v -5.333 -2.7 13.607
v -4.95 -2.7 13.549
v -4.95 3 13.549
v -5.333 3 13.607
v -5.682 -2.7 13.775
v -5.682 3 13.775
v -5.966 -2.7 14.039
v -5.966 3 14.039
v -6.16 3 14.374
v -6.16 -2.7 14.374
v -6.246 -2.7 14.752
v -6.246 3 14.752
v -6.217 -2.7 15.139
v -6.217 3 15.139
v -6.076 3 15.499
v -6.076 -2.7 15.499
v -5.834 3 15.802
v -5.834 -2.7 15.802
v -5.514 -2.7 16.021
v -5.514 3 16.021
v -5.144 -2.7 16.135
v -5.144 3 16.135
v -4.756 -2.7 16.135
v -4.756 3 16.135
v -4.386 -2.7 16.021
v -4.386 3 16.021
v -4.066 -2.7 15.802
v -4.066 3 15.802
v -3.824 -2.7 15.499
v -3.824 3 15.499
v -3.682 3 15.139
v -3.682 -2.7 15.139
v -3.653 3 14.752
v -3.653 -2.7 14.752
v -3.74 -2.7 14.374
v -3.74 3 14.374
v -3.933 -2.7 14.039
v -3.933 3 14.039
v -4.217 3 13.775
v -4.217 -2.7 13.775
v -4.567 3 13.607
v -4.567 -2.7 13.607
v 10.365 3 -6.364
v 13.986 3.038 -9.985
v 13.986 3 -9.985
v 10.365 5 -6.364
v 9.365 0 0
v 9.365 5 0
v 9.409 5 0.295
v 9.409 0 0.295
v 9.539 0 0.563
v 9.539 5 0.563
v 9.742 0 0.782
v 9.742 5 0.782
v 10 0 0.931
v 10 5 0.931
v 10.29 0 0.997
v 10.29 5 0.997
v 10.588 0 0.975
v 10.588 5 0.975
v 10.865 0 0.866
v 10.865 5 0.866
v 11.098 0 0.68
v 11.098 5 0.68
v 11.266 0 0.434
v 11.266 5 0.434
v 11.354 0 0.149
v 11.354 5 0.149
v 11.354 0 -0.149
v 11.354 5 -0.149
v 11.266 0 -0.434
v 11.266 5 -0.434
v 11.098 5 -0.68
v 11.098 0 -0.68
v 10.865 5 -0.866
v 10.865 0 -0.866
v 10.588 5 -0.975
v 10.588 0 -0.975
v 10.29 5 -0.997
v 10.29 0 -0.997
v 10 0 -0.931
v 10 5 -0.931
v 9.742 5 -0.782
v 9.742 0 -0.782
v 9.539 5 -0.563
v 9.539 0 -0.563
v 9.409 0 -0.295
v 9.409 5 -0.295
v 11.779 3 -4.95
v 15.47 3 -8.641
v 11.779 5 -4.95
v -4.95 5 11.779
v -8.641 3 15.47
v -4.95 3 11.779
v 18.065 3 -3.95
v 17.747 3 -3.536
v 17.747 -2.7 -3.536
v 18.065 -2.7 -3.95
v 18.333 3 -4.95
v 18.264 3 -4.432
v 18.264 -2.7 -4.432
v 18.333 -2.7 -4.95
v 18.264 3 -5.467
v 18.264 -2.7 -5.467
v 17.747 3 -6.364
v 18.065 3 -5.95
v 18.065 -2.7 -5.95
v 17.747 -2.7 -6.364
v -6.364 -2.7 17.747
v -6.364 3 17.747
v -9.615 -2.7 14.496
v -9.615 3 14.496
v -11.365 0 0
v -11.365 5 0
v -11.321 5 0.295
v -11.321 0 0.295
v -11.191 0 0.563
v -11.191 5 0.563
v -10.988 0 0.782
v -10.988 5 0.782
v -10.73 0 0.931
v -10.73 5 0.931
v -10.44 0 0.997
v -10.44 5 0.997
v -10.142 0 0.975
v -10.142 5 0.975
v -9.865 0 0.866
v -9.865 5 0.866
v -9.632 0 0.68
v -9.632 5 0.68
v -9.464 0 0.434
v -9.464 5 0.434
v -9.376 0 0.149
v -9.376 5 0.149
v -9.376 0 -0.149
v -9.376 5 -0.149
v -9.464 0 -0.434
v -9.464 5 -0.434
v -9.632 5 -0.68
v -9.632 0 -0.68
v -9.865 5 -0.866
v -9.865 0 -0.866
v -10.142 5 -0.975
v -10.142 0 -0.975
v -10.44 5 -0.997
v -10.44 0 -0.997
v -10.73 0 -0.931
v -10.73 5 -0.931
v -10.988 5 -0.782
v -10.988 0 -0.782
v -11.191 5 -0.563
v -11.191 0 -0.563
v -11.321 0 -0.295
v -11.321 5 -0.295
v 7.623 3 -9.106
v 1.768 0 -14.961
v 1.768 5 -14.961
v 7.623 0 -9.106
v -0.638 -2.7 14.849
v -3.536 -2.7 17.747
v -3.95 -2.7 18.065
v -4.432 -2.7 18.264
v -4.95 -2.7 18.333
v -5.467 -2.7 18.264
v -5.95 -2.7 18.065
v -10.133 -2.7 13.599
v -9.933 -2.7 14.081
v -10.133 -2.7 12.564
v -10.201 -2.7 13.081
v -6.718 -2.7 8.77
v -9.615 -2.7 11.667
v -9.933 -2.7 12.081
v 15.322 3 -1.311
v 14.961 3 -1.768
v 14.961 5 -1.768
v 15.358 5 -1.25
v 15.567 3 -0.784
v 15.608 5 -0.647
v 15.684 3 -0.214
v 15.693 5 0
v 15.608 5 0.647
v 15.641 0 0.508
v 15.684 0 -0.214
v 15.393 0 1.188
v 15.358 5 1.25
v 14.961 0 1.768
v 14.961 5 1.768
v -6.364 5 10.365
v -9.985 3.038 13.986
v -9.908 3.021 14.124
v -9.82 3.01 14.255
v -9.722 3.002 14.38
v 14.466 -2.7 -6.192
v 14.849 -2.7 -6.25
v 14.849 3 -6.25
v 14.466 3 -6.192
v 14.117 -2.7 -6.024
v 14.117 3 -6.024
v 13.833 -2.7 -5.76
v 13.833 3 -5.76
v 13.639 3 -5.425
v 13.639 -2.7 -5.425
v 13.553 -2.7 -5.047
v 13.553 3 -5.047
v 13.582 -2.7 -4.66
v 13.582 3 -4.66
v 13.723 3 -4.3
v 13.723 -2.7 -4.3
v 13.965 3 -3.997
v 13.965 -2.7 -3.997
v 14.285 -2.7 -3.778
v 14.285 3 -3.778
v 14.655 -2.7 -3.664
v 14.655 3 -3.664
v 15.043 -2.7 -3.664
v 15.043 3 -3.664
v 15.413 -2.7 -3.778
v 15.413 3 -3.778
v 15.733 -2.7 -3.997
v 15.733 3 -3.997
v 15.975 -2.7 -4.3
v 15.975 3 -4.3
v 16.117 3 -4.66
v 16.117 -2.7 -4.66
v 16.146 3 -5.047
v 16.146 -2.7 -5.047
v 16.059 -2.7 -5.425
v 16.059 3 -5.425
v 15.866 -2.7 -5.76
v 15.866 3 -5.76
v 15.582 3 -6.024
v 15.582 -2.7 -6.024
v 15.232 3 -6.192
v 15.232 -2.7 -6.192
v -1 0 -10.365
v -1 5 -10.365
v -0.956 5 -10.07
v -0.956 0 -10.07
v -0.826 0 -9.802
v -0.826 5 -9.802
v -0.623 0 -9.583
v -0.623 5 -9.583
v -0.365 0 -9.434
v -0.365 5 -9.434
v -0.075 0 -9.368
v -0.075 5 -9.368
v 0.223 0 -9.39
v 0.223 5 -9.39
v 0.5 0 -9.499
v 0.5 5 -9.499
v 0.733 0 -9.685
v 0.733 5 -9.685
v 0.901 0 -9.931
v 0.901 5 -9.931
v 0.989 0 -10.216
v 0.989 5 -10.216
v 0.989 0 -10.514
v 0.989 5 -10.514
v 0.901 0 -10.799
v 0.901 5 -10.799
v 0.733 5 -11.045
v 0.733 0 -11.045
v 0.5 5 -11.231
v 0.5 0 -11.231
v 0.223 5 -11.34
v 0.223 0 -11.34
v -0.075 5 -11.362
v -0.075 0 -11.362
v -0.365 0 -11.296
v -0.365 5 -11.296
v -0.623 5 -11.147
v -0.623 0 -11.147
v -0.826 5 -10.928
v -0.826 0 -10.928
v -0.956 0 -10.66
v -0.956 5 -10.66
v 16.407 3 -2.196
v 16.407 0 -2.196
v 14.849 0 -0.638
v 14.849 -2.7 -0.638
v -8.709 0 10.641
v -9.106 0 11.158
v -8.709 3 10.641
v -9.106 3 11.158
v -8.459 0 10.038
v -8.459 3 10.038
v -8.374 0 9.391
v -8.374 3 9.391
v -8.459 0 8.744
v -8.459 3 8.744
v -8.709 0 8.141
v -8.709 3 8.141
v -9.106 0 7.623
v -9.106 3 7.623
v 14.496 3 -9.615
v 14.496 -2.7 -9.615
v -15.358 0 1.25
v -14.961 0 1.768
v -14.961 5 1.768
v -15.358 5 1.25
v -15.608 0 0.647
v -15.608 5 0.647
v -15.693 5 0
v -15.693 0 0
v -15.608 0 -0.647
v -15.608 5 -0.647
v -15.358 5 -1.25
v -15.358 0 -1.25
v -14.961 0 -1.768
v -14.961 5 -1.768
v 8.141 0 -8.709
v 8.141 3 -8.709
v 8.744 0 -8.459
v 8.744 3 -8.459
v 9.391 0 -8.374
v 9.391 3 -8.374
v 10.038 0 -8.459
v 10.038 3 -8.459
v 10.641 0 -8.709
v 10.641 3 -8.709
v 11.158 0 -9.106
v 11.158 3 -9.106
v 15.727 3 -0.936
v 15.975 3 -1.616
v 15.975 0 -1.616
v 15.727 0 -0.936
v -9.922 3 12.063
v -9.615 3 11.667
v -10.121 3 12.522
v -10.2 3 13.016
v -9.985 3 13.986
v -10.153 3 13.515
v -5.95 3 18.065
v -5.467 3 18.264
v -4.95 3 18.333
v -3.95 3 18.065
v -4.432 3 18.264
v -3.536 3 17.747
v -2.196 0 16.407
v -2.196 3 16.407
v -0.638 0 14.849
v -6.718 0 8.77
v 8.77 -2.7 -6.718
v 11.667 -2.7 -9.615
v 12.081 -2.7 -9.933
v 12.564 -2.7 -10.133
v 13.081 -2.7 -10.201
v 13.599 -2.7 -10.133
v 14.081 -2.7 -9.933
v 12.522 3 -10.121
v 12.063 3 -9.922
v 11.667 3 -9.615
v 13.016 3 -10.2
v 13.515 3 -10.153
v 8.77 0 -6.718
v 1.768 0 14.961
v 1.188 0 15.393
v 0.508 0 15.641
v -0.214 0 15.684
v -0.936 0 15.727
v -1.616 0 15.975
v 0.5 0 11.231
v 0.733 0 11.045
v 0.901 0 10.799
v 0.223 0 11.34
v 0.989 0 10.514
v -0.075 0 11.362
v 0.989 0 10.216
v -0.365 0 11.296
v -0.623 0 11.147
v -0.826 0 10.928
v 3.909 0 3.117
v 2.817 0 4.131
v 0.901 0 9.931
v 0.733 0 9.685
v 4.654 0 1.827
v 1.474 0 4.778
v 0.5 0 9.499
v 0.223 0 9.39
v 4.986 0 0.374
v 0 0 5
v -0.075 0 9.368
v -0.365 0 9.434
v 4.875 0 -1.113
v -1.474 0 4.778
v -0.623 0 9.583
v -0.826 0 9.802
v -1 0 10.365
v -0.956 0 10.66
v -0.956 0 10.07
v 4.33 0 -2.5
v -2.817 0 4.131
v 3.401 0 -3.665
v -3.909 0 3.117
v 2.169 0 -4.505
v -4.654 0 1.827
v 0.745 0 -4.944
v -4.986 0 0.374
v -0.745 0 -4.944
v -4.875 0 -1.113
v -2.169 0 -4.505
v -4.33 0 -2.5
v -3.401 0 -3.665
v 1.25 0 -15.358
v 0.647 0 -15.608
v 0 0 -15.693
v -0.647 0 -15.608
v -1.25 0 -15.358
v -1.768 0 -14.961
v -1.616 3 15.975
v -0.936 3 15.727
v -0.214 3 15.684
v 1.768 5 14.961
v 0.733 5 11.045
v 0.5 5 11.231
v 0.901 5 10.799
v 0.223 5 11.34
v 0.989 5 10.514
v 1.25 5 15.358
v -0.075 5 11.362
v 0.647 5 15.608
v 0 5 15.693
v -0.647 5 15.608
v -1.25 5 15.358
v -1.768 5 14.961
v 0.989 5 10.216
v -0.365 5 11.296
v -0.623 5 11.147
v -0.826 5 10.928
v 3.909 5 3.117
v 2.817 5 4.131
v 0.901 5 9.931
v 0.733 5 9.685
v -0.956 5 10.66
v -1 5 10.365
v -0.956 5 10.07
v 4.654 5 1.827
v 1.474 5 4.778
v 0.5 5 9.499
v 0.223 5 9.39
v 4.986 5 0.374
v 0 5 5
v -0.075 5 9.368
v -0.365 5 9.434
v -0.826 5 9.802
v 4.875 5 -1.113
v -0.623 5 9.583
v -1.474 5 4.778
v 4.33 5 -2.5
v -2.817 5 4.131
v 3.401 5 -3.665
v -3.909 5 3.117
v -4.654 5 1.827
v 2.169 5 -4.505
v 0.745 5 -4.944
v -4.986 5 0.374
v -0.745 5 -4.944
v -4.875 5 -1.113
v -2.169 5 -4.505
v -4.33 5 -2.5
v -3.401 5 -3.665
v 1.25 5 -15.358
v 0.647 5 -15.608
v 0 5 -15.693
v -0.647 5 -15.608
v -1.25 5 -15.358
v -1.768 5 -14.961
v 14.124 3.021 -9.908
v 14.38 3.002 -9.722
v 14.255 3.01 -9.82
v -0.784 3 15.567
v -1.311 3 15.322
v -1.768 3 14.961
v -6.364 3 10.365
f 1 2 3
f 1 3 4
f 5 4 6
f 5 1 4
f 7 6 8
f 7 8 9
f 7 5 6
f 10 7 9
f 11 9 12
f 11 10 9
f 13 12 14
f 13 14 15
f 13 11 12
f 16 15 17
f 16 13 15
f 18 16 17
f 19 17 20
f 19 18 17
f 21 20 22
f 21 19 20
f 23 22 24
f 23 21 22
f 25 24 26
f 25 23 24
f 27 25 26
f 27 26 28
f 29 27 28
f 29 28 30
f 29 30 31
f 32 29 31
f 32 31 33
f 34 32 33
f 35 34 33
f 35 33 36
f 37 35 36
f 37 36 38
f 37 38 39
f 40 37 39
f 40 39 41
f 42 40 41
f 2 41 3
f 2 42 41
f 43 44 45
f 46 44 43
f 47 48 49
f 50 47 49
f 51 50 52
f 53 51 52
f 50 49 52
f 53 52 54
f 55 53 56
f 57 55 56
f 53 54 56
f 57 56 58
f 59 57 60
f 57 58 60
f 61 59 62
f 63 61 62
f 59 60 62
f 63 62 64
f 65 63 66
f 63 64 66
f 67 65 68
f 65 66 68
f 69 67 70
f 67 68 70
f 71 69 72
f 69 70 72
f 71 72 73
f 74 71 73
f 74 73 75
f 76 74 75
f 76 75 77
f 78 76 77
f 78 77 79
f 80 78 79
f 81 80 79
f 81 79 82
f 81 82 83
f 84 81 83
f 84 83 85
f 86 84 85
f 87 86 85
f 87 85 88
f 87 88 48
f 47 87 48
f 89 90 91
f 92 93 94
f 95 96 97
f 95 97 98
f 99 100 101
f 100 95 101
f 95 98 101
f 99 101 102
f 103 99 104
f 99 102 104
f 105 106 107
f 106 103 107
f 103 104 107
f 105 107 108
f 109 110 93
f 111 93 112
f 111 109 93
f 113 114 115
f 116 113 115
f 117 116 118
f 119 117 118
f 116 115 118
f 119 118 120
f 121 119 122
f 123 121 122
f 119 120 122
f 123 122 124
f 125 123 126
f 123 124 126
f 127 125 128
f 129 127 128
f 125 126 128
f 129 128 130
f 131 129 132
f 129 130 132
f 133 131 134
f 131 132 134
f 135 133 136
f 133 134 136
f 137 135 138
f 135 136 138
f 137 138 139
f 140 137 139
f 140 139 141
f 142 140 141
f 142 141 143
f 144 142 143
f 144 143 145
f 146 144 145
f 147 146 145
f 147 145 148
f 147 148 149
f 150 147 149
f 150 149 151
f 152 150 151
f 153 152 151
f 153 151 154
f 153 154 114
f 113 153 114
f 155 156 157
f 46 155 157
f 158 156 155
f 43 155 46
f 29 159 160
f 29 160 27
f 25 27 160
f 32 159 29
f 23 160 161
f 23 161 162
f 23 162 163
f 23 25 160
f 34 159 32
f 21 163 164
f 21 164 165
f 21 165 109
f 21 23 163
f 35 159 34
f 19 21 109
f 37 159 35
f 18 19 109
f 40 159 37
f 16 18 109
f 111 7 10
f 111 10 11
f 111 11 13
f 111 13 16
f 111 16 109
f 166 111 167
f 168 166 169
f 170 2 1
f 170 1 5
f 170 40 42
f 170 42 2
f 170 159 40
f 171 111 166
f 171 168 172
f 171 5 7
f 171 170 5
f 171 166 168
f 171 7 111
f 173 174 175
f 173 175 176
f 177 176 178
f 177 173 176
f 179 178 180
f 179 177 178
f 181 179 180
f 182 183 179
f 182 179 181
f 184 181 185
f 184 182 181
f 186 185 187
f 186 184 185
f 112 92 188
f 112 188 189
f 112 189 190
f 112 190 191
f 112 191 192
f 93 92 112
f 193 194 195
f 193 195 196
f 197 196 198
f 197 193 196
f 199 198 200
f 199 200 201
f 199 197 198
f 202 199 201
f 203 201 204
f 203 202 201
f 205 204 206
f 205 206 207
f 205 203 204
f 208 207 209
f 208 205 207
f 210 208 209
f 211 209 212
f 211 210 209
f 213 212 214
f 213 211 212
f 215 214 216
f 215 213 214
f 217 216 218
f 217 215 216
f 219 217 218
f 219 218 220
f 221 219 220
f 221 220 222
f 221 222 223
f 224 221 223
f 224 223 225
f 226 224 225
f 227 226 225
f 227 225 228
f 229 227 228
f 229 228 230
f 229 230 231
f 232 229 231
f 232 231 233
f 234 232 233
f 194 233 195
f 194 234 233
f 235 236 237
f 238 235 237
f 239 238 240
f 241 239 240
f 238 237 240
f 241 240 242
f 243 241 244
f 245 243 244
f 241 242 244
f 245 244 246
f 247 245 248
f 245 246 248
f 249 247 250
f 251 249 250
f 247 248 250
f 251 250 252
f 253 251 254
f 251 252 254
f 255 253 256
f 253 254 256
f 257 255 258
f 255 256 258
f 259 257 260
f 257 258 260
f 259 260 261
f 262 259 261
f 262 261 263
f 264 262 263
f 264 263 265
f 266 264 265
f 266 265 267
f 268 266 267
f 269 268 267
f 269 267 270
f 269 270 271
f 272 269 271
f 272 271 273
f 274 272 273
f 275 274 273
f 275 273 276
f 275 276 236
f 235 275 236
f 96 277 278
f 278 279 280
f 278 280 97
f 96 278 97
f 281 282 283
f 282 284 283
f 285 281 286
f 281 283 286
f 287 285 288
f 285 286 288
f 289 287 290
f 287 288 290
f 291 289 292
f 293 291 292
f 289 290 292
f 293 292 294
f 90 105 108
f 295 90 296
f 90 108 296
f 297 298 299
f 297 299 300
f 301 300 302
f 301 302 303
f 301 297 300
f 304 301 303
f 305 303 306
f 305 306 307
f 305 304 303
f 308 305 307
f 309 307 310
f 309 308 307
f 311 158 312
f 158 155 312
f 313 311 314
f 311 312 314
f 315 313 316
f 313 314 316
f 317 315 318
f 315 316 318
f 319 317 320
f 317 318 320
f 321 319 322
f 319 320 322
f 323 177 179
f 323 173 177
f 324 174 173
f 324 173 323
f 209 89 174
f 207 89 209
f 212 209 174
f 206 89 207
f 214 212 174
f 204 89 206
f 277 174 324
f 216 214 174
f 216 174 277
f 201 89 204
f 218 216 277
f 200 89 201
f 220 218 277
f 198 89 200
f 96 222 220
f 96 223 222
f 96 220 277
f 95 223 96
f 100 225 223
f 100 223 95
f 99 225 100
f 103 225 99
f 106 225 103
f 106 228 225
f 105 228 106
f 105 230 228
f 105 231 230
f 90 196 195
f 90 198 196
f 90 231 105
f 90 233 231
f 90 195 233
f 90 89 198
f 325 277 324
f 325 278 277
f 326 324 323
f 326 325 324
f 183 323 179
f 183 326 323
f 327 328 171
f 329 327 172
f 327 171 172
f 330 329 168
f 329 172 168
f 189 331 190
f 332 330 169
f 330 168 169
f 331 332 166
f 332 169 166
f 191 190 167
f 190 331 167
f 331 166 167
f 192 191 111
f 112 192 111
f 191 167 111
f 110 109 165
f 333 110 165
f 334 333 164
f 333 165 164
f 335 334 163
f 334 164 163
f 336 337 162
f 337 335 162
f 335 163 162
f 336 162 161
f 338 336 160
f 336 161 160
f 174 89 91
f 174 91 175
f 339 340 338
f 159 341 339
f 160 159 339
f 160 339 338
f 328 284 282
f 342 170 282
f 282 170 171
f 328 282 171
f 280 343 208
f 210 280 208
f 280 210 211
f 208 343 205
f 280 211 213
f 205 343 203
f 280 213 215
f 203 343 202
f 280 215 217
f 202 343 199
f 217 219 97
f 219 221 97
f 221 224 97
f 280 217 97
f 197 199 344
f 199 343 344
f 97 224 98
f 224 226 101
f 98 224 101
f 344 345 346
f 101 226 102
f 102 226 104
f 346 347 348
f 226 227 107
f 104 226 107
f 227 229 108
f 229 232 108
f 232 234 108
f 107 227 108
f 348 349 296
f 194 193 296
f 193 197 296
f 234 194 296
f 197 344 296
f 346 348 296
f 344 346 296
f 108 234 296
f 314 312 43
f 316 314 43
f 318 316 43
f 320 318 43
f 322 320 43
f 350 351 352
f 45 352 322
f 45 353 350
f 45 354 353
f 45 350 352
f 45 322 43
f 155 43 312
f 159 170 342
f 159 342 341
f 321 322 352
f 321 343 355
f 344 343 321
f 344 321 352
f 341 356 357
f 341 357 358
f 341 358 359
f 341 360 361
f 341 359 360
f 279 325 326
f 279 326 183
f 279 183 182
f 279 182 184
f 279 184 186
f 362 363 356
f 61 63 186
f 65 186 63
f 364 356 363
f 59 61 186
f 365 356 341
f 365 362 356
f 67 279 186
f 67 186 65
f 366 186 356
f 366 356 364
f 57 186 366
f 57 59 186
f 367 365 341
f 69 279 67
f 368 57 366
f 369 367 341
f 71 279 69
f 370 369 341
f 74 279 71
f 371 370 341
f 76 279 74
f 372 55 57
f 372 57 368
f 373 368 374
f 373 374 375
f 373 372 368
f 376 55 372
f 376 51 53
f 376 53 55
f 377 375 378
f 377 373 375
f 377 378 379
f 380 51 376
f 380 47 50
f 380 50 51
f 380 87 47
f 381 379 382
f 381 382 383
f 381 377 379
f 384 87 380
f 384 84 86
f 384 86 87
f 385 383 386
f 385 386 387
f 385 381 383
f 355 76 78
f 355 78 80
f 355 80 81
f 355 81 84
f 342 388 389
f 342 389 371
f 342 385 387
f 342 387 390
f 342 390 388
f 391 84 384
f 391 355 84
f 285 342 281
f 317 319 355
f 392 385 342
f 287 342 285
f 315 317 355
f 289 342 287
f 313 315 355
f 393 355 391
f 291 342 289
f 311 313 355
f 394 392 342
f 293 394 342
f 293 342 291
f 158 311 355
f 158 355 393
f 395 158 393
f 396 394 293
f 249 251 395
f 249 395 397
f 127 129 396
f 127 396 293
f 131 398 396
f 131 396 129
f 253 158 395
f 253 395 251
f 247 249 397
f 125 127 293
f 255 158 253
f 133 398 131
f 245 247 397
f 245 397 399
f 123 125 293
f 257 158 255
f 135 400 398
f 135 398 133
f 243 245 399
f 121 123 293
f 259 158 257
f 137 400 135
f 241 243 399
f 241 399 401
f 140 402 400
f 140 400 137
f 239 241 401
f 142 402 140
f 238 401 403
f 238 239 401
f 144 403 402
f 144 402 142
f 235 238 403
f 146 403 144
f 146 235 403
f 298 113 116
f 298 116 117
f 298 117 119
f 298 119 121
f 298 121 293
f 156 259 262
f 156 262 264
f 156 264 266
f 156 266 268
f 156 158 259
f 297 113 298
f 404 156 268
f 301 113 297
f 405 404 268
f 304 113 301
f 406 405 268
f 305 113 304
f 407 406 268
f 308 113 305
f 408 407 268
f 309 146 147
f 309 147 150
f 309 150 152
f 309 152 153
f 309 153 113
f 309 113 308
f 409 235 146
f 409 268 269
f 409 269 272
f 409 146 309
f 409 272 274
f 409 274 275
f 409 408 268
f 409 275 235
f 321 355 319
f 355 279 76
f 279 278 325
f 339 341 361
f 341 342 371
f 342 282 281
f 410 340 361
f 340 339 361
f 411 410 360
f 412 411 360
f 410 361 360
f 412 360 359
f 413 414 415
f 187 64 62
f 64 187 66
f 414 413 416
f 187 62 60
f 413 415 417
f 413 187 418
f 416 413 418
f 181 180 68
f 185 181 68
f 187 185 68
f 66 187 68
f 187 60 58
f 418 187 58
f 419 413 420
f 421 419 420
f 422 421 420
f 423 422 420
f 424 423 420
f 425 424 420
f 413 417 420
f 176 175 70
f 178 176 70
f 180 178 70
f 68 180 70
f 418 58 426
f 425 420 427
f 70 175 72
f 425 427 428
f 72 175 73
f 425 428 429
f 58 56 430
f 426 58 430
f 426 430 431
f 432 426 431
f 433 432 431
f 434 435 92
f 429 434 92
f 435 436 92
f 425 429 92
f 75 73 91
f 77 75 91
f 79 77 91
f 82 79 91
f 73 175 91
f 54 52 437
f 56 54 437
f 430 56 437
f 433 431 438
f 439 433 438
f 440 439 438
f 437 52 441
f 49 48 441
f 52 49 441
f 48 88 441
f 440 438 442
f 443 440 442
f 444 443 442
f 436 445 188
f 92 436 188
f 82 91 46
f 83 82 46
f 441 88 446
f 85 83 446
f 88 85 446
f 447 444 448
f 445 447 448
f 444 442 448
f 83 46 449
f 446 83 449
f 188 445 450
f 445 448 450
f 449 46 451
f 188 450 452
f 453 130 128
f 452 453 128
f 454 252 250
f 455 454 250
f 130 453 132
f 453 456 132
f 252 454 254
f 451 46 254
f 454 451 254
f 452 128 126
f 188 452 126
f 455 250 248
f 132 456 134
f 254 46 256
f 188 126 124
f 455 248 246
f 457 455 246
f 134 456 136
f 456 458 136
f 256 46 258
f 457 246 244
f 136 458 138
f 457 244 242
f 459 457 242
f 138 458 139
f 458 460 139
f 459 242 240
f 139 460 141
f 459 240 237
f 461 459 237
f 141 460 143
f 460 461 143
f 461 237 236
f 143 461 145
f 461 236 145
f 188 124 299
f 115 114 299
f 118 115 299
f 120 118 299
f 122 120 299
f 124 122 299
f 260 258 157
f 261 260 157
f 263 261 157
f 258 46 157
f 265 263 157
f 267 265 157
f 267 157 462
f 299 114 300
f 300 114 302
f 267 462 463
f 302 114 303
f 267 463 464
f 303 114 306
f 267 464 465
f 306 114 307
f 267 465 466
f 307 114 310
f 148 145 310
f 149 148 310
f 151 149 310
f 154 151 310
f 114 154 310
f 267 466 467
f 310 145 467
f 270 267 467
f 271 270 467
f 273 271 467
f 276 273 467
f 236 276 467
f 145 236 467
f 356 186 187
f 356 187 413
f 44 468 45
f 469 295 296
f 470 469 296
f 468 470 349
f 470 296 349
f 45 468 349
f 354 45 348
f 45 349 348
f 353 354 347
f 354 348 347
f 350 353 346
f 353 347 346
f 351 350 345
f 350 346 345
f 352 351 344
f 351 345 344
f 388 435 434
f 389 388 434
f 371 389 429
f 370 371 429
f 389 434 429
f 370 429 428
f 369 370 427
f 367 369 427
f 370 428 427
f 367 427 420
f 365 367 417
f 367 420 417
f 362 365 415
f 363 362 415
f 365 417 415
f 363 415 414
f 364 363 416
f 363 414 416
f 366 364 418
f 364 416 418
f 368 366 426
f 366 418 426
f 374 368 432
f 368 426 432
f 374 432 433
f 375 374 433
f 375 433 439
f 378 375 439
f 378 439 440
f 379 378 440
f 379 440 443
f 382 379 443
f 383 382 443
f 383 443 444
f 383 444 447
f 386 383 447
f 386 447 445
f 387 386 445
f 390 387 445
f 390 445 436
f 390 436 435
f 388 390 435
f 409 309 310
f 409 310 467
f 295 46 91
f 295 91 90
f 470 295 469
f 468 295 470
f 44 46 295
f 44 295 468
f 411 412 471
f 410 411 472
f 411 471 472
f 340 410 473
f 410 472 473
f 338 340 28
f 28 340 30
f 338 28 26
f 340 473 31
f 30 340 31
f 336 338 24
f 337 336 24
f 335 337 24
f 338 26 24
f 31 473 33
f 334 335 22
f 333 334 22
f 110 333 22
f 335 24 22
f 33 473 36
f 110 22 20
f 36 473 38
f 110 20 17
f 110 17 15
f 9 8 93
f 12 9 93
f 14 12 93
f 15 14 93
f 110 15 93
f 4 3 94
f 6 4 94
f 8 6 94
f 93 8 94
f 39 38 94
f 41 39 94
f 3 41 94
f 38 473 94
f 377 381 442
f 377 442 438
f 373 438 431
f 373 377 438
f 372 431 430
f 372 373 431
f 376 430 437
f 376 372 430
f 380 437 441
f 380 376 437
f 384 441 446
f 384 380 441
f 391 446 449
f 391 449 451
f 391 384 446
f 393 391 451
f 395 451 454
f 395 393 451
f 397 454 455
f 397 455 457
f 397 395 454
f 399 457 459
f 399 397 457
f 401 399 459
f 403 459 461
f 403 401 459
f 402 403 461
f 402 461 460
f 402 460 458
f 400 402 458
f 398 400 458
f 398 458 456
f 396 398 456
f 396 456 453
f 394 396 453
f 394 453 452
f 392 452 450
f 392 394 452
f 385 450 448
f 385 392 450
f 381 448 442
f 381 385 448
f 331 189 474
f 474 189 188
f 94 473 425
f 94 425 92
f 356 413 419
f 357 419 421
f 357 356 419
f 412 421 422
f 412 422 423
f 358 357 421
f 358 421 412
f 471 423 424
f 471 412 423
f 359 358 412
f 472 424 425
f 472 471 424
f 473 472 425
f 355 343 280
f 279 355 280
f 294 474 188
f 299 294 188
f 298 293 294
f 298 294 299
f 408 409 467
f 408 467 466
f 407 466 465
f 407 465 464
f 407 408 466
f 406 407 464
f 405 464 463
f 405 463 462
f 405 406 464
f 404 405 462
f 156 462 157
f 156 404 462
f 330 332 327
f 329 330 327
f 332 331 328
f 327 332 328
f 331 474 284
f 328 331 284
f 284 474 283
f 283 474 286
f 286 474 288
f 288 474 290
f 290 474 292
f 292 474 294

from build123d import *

# Parameters (mm, degrees)
SKETCH1_R                 = 0.5
SKETCH1_R_2               = 5
BOSS_EXTRUDE1_DEPTH       = 5
SKETCH3_R                 = 1.3
BOSS_EXTRUDE4_DEPTH       = 5.7
BOSS_EXTRUDE6_DEPTH       = 1
FILLET1_R                 = 2.5
FILLET2_R                 = 2
F_2_0MM_DOWEL_HOLE1_D     = 2
F_2_0MM_DOWEL_HOLE1_DEPTH = 42.93
F_2_0MM_DOWEL_HOLE1_TIP   = 0.600860619


with BuildPart() as part:
    # Sketch1 → Boss-Extrude1 (new body)
    with BuildSketch(Plane(origin=(0, 0, 0), x_dir=(1, 0, 0), z_dir=(0, 1, 0))):
        with BuildLine():
            Line((1.767766953, 14.961194078), (14.961194078, 1.767766953))
            ThreePointArc((14.961194078, 1.767766953), (15.693427125, 0), (14.961194078, -1.767766953))
            Line((14.961194078, -1.767766953), (1.767766953, -14.961194078))
            ThreePointArc((1.767766953, -14.961194078), (0, -15.693427125), (-1.767766953, -14.961194078))
            Line((-1.767766953, -14.961194078), (-14.961194078, -1.767766953))
            ThreePointArc((-14.961194078, -1.767766953), (-15.693427125, 0), (-14.961194078, 1.767766953))
            Line((-14.961194078, 1.767766953), (-1.767766953, 14.961194078))
            ThreePointArc((-1.767766953, 14.961194078), (0, 15.693427125), (1.767766953, 14.961194078))
        make_face()
        with Locations(Location((0, 10.365, 0), (0, 0, 270))):
            Circle(SKETCH1_R, mode=Mode.SUBTRACT)
        with Locations(Location((0, -10.365, 0), (0, 0, 270))):
            Circle(SKETCH1_R, mode=Mode.SUBTRACT)
        with Locations(Location((10.365, 0, 0), (0, 0, 270))):
            Circle(SKETCH1_R, mode=Mode.SUBTRACT)
        with Locations(Location((-10.365, 0, 0), (0, 0, 270))):
            Circle(SKETCH1_R, mode=Mode.SUBTRACT)
        with Locations(Location((0, 0, 0), (0, 0, 270))):
            Circle(SKETCH1_R_2, mode=Mode.SUBTRACT)
    extrude(amount=BOSS_EXTRUDE1_DEPTH)

    # Sketch3 → Boss-Extrude4 (add)
    # profile 1 of 4: a face of its own
    with BuildSketch(Plane(origin=(0, -2.7, 0), x_dir=(1, 0, 0), z_dir=(0, 1, 0))):
        Polygon((-4.949747468, -10.537489101), (-0.637994164, -14.849242405), (-4.949747468, -19.160995709), (-9.261500772, -14.849242405), align=None)
        with Locations(Location((-4.949747468, -14.849242405, 0), (0, 0, 90))):
            Circle(SKETCH3_R, mode=Mode.SUBTRACT)
    # profile 2 of 4: a face of its own
    with BuildSketch(Plane(origin=(0, -2.7, 0), x_dir=(1, 0, 0), z_dir=(0, 1, 0))):
        Polygon((-6.717514421, -8.769722148), (-11.029267725, -13.081475452), (-9.261500772, -14.849242405), (-4.949747468, -10.537489101), align=None)
    # profile 3 of 4: a face of its own
    with BuildSketch(Plane(origin=(0, -2.7, 0), x_dir=(1, 0, 0), z_dir=(0, 1, 0))):
        Polygon((19.160995709, 4.949747468), (14.849242405, 9.261500772), (10.537489101, 4.949747468), (14.849242405, 0.637994164), align=None)
        with Locations(Location((14.849242405, 4.949747468, 0), (0, 0, 90))):
            Circle(SKETCH3_R, mode=Mode.SUBTRACT)
    # profile 4 of 4: a face of its own
    with BuildSketch(Plane(origin=(0, -2.7, 0), x_dir=(1, 0, 0), z_dir=(0, 1, 0))):
        Polygon((13.081475452, 11.029267725), (14.849242405, 9.261500772), (10.537489101, 4.949747468), (8.769722148, 6.717514421), align=None)
    extrude(amount=BOSS_EXTRUDE4_DEPTH)


with BuildPart() as boss_extrude6_tool:
    # Sketch7 → Boss-Extrude6 (new, symmetric)
    with BuildSketch(Plane(origin=(2.707626069, -2.13e-07, 2.707626069), x_dir=(0.7071067811865474, 0, -0.7071067811865478), z_dir=(0.7071067811865467, -5.5755039757469385e-08, 0.7071067811865462))):
        Polygon((11.829161787, 5.00000052), (17.04887, 3.00000056), (11.829161787, 3.00000052), align=None)
        Polygon((-11.829161787, 5.00000052), (-17.04887, 3.00000056), (-11.829161787, 3.00000052), align=None)
    extrude(amount=BOSS_EXTRUDE6_DEPTH, both=True)


with BuildPart() as part_1:
    add(part.part)


with BuildPart() as part_2:
    # Boss-Extrude6: joined with boss_extrude6_tool
    add(part_1.part.fuse(boss_extrude6_tool.part, tol=0.00001))

    # Fillet1
    fillet1_edges = [part_2.edges().sort_by_distance(p)[0] for p in [
        (-7.338376652, 1.5, 9.390584379),
        (-1.184018869, 1.5, 15.395267109),
        (9.390584379, 1.5, -7.338376652),
        (15.395267109, 1.5, -1.184018869),
    ]]
    fillet(fillet1_edges, radius=FILLET1_R)

    # Fillet2
    # the kernel refuses this fillet: 2 mm, written as the material it takes off along each edge
    with BuildSketch(Plane(origin=(-4.949747468, -7.7, 19.160995709), x_dir=(-0.7071067811865471, 0, -0.707106781186548), z_dir=(0, 1, 0)), Plane(origin=(13.081475452, -7.7, -11.029267725), x_dir=(0.7071067811865476, 0, 0.7071067811865476), z_dir=(0, 1, 0))) as fillet2_piece_1:
        with BuildLine():
            CenterArc((FILLET2_R, -FILLET2_R), FILLET2_R, 90, 90)
            Line((0, -FILLET2_R), (0, 0))
            Line((0, 0), (FILLET2_R, 0))
        make_face()
    extrude(amount=15.7, mode=Mode.SUBTRACT)
    with BuildSketch(Plane(origin=(-11.029267725, -7.7, 13.081475452), x_dir=(0.707106781186547, 0, 0.7071067811865479), z_dir=(0, 1, 0)), Plane(origin=(19.160995709, -7.7, -4.949747468), x_dir=(-0.7071067811865482, 0, -0.7071067811865469), z_dir=(0, 1, 0))) as fillet2_piece_2:
        with BuildLine():
            CenterArc((FILLET2_R, FILLET2_R), FILLET2_R, 180, 90)
            Line((0, FILLET2_R), (0, 0))
            Line((0, 0), (FILLET2_R, 0))
        make_face()
    extrude(amount=15.7, mode=Mode.SUBTRACT)

    # Ø2.0mm Dowel Hole1
    with Locations(Plane.XZ):
        with Locations((0, 10.365), (10.365, 0), (-10.365, 0), (0, -10.365)):
            Hole(F_2_0MM_DOWEL_HOLE1_D / 2, depth=F_2_0MM_DOWEL_HOLE1_DEPTH)
            with Locations((0, 0, -(F_2_0MM_DOWEL_HOLE1_DEPTH + F_2_0MM_DOWEL_HOLE1_TIP / 2))):  # 118° drill point
                Cone(0, F_2_0MM_DOWEL_HOLE1_D / 2, F_2_0MM_DOWEL_HOLE1_TIP, mode=Mode.SUBTRACT)


solid = part_2.part
